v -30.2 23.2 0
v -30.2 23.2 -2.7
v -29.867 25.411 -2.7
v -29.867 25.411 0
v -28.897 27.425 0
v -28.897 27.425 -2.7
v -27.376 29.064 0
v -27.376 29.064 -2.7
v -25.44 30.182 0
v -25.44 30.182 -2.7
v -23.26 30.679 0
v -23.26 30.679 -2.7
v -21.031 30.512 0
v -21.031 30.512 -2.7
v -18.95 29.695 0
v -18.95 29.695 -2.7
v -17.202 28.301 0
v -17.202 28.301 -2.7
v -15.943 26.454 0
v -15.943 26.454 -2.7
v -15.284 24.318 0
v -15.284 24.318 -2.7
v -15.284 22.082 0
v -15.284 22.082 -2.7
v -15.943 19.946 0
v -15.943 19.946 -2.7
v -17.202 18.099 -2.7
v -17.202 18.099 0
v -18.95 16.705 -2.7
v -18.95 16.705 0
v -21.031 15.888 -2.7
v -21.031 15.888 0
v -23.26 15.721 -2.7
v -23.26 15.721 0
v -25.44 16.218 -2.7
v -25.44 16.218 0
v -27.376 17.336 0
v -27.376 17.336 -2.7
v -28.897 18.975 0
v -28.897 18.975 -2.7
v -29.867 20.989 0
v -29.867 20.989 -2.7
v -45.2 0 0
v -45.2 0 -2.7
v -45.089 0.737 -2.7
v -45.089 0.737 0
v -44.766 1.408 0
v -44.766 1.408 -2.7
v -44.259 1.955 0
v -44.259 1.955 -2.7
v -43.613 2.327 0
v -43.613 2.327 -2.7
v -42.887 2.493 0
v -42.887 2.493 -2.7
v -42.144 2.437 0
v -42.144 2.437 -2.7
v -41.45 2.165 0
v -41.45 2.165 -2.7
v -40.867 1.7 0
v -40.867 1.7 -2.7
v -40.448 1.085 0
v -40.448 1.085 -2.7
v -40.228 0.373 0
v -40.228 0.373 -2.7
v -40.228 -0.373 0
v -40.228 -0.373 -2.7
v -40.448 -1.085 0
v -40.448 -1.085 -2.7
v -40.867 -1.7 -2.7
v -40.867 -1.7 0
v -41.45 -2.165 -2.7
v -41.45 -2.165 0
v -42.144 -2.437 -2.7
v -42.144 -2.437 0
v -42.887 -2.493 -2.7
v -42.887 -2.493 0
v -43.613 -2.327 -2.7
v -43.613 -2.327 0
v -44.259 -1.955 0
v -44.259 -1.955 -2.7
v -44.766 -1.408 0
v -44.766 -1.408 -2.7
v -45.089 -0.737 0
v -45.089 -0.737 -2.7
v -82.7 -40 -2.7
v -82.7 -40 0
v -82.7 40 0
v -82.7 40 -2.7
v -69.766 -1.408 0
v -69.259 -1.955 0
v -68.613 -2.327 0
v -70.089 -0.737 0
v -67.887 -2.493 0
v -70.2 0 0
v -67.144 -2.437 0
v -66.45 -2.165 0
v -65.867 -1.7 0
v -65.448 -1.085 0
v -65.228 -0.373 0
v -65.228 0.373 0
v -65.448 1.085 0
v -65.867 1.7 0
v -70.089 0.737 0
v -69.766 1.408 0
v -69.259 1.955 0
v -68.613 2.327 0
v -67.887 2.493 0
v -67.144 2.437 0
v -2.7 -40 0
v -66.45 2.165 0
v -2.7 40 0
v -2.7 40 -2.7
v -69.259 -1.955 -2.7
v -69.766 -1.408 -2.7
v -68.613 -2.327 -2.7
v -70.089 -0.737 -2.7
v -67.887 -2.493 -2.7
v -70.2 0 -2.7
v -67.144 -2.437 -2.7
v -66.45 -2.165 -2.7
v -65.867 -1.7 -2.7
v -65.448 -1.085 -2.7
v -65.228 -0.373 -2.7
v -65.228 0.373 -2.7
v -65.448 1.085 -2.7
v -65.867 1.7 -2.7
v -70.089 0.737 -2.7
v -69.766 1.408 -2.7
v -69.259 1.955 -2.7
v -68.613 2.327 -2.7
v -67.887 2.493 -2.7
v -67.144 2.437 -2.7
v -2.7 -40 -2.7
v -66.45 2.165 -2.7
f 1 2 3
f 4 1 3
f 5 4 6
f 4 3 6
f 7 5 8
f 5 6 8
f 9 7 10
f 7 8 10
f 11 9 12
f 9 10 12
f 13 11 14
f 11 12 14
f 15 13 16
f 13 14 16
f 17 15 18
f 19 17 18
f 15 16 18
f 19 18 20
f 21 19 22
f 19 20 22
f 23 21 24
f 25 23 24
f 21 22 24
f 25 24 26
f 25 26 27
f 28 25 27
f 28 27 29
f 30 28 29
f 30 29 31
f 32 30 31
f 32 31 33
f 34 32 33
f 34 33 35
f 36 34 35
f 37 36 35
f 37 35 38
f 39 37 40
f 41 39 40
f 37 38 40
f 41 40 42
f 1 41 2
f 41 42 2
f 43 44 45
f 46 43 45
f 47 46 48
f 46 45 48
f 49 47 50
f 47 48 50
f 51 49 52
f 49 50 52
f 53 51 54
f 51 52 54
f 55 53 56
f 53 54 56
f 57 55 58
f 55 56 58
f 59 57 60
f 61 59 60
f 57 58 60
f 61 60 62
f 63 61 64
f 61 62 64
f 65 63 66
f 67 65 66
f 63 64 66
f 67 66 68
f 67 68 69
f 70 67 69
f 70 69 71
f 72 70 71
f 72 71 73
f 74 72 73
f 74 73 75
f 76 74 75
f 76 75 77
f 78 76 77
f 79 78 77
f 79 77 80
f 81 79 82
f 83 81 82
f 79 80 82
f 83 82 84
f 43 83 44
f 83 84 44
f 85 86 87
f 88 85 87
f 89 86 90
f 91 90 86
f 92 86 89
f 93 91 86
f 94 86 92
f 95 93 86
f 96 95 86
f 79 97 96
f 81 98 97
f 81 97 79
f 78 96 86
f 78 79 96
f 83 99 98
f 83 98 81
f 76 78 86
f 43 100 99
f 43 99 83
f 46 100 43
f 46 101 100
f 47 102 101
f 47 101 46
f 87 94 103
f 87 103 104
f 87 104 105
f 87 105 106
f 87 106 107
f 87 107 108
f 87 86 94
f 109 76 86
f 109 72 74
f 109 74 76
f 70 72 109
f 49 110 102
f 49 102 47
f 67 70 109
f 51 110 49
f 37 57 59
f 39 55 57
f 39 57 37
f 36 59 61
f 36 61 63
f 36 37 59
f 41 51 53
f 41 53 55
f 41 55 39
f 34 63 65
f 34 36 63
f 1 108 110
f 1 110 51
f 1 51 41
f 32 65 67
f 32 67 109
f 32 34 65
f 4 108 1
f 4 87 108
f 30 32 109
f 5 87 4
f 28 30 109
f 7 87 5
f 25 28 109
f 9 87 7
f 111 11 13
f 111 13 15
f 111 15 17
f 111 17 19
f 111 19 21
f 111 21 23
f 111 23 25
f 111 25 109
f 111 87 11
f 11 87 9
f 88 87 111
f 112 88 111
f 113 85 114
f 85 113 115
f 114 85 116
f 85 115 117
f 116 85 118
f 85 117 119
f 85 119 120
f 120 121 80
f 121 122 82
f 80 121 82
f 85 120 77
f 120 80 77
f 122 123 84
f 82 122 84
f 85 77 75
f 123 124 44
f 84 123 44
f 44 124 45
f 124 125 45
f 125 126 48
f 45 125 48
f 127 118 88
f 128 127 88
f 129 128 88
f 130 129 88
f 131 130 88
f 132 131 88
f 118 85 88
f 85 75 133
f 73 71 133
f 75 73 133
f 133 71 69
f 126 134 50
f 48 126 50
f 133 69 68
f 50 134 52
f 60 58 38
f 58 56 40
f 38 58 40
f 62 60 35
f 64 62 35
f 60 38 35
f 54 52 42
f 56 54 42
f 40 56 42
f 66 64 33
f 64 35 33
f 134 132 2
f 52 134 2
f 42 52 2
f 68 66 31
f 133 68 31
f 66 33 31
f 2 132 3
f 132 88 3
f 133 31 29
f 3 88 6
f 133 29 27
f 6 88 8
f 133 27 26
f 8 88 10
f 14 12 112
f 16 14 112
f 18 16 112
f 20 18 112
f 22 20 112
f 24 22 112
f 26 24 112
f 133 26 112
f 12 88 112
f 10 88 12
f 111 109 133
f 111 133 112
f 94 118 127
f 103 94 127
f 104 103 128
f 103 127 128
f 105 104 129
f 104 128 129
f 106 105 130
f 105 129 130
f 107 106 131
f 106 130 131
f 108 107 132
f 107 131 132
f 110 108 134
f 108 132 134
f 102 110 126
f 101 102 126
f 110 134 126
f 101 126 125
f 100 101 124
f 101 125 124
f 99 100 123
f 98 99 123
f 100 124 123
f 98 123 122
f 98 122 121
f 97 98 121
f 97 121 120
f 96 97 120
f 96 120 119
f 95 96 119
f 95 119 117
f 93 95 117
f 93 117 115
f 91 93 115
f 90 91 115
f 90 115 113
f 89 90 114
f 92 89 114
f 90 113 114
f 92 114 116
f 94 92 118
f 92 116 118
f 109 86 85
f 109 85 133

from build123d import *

# Parameters (mm, degrees)
CROQUIS1_W              = 80
CROQUIS1_H              = 80
SALIENTE_EXTRUIR2_DEPTH = 2.7
CROQUIS2_R              = 2.5
CORTAR_EXTRUIR1_DEPTH   = 2.7
CROQUIS4_R              = 7.5
CORTAR_EXTRUIR2_DEPTH   = 2.7


with BuildPart() as part:
    # Croquis1 → Saliente-Extruir2 (new body)
    with BuildSketch(Plane.XY):
        with Locations((-42.7, 0)):
            Rectangle(CROQUIS1_W, CROQUIS1_H)
    extrude(amount=-SALIENTE_EXTRUIR2_DEPTH)

    # Croquis2 → Cortar-Extruir1 (cut)
    with BuildSketch(Plane(origin=(0, 0, -2.7), x_dir=(-1, 0, 0), z_dir=(0, 0, -1))):
        with Locations((67.7, 0)):
            Circle(CROQUIS2_R)
        with Locations((42.7, 0)):
            Circle(CROQUIS2_R)
    extrude(amount=-CORTAR_EXTRUIR1_DEPTH, mode=Mode.SUBTRACT)

    # Croquis4 → Cortar-Extruir2 (cut)
    with BuildSketch(Plane(origin=(0, 0, -2.7), x_dir=(-1, 0, 0), z_dir=(0, 0, -1))):
        with Locations((22.7, 23.2)):
            Circle(CROQUIS4_R)
    extrude(amount=-CORTAR_EXTRUIR2_DEPTH, mode=Mode.SUBTRACT)


solid = part.part
